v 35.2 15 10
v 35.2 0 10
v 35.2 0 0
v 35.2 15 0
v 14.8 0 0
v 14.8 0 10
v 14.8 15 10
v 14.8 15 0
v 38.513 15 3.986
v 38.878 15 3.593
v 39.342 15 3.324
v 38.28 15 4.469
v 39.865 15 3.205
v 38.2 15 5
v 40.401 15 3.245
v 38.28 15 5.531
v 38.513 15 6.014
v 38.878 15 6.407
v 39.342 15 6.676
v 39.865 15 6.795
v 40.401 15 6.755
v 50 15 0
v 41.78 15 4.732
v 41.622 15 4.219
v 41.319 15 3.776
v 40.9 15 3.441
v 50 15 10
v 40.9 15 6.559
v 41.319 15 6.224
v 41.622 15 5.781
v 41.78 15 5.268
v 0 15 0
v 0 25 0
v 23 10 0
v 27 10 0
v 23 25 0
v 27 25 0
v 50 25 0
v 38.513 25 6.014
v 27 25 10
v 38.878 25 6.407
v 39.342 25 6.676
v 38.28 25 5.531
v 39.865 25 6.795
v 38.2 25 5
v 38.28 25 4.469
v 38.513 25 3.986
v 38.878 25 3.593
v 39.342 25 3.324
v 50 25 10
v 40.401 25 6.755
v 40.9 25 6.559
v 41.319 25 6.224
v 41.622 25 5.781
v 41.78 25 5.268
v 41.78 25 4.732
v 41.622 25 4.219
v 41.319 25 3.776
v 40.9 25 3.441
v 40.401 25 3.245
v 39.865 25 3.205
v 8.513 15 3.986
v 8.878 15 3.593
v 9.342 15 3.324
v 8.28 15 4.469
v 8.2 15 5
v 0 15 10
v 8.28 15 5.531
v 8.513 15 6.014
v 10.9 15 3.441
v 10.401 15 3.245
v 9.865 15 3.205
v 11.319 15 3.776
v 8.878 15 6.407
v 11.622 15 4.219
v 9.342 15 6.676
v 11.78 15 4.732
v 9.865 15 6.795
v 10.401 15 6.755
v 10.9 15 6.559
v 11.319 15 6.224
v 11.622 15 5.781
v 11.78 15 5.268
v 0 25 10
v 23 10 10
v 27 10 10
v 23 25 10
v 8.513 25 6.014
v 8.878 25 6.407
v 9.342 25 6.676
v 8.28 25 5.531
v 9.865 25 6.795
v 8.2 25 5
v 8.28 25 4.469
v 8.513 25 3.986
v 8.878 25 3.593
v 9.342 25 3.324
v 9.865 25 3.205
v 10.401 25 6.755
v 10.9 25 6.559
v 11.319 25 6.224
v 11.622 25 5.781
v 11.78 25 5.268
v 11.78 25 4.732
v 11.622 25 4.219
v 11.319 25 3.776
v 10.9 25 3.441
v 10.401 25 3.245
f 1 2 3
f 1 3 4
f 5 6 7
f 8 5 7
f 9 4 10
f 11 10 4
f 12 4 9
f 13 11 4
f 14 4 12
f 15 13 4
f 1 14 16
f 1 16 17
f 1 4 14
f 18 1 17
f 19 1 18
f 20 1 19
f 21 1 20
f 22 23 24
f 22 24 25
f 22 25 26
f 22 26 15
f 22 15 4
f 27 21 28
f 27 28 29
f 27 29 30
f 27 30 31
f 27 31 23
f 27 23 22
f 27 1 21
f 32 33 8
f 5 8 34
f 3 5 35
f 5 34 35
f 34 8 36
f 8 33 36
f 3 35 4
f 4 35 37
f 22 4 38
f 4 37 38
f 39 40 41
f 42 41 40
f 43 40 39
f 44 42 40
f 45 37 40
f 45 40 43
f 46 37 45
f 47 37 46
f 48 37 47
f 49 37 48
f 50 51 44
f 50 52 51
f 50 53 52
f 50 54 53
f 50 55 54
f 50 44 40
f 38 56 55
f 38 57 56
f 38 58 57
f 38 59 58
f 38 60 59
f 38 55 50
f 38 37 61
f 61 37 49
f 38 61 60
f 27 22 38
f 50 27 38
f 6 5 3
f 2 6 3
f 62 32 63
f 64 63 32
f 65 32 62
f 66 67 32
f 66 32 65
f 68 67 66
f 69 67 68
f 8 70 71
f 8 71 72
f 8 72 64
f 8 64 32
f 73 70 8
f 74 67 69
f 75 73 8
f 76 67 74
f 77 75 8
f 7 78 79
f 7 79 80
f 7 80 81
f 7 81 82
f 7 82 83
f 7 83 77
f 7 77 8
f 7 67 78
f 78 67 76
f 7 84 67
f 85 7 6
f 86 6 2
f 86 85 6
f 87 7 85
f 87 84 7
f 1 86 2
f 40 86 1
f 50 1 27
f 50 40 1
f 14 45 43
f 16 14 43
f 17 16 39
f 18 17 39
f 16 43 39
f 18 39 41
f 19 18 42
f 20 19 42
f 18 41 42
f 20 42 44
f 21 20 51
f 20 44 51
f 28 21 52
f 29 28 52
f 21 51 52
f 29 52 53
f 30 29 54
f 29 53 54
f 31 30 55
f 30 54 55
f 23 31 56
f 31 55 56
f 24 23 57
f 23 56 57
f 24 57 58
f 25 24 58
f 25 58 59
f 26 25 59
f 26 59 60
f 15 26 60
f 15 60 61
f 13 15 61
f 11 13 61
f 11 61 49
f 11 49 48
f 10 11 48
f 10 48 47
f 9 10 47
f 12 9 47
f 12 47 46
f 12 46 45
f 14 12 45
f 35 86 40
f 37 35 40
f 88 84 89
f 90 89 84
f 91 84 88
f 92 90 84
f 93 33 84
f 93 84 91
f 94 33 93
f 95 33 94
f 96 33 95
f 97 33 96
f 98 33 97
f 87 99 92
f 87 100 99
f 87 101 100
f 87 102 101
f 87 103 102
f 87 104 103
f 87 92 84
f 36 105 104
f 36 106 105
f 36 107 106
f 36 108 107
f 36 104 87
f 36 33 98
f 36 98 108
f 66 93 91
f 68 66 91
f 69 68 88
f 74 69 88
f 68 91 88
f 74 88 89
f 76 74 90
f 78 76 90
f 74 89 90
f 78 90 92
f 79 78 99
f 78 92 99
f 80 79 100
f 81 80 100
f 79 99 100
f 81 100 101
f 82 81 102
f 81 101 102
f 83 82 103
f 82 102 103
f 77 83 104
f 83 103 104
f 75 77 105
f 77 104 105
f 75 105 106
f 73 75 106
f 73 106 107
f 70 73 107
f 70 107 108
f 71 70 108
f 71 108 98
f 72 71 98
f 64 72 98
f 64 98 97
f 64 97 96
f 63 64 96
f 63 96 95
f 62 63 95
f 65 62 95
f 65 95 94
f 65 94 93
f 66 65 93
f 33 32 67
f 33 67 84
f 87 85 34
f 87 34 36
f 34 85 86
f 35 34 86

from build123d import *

# Parameters (mm, degrees)
SKETCH1_W           = 50
SKETCH1_H           = 25
BOSS_EXTRUDE1_DEPTH = 10
SKETCH2_R           = 1.8
CUT_EXTRUDE1_DEPTH  = 57.789083458
SKETCH3_W           = 4
SKETCH3_H           = 15
CUT_EXTRUDE2_DEPTH  = 10
SKETCH6_W           = 14.8
SKETCH6_H           = 15
CUT_EXTRUDE3_DEPTH  = 57.789083458


with BuildPart() as part:
    # Sketch1 → Boss-Extrude1 (new body)
    with BuildSketch(Plane.XY):
        with Locations((25, 12.5)):
            Rectangle(SKETCH1_W, SKETCH1_H)
    extrude(amount=BOSS_EXTRUDE1_DEPTH)

    # Sketch2 → Cut-Extrude1 (cut, through all)
    with BuildSketch(Plane(origin=(0, 25, 0), x_dir=(1, 0, 0), z_dir=(0, 1, 0))):
        with Locations(Location((10, -5, 0), (0, 0, 180))):
            Circle(SKETCH2_R)
        with Locations(Location((40, -5, 0), (0, 0, 180))):
            Circle(SKETCH2_R)
    extrude(amount=-CUT_EXTRUDE1_DEPTH, mode=Mode.SUBTRACT)

    # Sketch3 → Cut-Extrude2 (cut)
    with BuildSketch(Plane.XY.offset(10)):
        with Locations((25, 17.5)):
            Rectangle(SKETCH3_W, SKETCH3_H)
    extrude(amount=-CUT_EXTRUDE2_DEPTH, mode=Mode.SUBTRACT)

    # Sketch6 → Cut-Extrude3 (cut, through all)
    with BuildSketch(Plane.XY.offset(10)):
        with Locations((7.4, 7.5)):
            Rectangle(SKETCH6_W, SKETCH6_H)
        with Locations((42.6, 7.5)):
            Rectangle(SKETCH6_W, SKETCH6_H)
    extrude(amount=-CUT_EXTRUDE3_DEPTH, mode=Mode.SUBTRACT)


solid = part.part
